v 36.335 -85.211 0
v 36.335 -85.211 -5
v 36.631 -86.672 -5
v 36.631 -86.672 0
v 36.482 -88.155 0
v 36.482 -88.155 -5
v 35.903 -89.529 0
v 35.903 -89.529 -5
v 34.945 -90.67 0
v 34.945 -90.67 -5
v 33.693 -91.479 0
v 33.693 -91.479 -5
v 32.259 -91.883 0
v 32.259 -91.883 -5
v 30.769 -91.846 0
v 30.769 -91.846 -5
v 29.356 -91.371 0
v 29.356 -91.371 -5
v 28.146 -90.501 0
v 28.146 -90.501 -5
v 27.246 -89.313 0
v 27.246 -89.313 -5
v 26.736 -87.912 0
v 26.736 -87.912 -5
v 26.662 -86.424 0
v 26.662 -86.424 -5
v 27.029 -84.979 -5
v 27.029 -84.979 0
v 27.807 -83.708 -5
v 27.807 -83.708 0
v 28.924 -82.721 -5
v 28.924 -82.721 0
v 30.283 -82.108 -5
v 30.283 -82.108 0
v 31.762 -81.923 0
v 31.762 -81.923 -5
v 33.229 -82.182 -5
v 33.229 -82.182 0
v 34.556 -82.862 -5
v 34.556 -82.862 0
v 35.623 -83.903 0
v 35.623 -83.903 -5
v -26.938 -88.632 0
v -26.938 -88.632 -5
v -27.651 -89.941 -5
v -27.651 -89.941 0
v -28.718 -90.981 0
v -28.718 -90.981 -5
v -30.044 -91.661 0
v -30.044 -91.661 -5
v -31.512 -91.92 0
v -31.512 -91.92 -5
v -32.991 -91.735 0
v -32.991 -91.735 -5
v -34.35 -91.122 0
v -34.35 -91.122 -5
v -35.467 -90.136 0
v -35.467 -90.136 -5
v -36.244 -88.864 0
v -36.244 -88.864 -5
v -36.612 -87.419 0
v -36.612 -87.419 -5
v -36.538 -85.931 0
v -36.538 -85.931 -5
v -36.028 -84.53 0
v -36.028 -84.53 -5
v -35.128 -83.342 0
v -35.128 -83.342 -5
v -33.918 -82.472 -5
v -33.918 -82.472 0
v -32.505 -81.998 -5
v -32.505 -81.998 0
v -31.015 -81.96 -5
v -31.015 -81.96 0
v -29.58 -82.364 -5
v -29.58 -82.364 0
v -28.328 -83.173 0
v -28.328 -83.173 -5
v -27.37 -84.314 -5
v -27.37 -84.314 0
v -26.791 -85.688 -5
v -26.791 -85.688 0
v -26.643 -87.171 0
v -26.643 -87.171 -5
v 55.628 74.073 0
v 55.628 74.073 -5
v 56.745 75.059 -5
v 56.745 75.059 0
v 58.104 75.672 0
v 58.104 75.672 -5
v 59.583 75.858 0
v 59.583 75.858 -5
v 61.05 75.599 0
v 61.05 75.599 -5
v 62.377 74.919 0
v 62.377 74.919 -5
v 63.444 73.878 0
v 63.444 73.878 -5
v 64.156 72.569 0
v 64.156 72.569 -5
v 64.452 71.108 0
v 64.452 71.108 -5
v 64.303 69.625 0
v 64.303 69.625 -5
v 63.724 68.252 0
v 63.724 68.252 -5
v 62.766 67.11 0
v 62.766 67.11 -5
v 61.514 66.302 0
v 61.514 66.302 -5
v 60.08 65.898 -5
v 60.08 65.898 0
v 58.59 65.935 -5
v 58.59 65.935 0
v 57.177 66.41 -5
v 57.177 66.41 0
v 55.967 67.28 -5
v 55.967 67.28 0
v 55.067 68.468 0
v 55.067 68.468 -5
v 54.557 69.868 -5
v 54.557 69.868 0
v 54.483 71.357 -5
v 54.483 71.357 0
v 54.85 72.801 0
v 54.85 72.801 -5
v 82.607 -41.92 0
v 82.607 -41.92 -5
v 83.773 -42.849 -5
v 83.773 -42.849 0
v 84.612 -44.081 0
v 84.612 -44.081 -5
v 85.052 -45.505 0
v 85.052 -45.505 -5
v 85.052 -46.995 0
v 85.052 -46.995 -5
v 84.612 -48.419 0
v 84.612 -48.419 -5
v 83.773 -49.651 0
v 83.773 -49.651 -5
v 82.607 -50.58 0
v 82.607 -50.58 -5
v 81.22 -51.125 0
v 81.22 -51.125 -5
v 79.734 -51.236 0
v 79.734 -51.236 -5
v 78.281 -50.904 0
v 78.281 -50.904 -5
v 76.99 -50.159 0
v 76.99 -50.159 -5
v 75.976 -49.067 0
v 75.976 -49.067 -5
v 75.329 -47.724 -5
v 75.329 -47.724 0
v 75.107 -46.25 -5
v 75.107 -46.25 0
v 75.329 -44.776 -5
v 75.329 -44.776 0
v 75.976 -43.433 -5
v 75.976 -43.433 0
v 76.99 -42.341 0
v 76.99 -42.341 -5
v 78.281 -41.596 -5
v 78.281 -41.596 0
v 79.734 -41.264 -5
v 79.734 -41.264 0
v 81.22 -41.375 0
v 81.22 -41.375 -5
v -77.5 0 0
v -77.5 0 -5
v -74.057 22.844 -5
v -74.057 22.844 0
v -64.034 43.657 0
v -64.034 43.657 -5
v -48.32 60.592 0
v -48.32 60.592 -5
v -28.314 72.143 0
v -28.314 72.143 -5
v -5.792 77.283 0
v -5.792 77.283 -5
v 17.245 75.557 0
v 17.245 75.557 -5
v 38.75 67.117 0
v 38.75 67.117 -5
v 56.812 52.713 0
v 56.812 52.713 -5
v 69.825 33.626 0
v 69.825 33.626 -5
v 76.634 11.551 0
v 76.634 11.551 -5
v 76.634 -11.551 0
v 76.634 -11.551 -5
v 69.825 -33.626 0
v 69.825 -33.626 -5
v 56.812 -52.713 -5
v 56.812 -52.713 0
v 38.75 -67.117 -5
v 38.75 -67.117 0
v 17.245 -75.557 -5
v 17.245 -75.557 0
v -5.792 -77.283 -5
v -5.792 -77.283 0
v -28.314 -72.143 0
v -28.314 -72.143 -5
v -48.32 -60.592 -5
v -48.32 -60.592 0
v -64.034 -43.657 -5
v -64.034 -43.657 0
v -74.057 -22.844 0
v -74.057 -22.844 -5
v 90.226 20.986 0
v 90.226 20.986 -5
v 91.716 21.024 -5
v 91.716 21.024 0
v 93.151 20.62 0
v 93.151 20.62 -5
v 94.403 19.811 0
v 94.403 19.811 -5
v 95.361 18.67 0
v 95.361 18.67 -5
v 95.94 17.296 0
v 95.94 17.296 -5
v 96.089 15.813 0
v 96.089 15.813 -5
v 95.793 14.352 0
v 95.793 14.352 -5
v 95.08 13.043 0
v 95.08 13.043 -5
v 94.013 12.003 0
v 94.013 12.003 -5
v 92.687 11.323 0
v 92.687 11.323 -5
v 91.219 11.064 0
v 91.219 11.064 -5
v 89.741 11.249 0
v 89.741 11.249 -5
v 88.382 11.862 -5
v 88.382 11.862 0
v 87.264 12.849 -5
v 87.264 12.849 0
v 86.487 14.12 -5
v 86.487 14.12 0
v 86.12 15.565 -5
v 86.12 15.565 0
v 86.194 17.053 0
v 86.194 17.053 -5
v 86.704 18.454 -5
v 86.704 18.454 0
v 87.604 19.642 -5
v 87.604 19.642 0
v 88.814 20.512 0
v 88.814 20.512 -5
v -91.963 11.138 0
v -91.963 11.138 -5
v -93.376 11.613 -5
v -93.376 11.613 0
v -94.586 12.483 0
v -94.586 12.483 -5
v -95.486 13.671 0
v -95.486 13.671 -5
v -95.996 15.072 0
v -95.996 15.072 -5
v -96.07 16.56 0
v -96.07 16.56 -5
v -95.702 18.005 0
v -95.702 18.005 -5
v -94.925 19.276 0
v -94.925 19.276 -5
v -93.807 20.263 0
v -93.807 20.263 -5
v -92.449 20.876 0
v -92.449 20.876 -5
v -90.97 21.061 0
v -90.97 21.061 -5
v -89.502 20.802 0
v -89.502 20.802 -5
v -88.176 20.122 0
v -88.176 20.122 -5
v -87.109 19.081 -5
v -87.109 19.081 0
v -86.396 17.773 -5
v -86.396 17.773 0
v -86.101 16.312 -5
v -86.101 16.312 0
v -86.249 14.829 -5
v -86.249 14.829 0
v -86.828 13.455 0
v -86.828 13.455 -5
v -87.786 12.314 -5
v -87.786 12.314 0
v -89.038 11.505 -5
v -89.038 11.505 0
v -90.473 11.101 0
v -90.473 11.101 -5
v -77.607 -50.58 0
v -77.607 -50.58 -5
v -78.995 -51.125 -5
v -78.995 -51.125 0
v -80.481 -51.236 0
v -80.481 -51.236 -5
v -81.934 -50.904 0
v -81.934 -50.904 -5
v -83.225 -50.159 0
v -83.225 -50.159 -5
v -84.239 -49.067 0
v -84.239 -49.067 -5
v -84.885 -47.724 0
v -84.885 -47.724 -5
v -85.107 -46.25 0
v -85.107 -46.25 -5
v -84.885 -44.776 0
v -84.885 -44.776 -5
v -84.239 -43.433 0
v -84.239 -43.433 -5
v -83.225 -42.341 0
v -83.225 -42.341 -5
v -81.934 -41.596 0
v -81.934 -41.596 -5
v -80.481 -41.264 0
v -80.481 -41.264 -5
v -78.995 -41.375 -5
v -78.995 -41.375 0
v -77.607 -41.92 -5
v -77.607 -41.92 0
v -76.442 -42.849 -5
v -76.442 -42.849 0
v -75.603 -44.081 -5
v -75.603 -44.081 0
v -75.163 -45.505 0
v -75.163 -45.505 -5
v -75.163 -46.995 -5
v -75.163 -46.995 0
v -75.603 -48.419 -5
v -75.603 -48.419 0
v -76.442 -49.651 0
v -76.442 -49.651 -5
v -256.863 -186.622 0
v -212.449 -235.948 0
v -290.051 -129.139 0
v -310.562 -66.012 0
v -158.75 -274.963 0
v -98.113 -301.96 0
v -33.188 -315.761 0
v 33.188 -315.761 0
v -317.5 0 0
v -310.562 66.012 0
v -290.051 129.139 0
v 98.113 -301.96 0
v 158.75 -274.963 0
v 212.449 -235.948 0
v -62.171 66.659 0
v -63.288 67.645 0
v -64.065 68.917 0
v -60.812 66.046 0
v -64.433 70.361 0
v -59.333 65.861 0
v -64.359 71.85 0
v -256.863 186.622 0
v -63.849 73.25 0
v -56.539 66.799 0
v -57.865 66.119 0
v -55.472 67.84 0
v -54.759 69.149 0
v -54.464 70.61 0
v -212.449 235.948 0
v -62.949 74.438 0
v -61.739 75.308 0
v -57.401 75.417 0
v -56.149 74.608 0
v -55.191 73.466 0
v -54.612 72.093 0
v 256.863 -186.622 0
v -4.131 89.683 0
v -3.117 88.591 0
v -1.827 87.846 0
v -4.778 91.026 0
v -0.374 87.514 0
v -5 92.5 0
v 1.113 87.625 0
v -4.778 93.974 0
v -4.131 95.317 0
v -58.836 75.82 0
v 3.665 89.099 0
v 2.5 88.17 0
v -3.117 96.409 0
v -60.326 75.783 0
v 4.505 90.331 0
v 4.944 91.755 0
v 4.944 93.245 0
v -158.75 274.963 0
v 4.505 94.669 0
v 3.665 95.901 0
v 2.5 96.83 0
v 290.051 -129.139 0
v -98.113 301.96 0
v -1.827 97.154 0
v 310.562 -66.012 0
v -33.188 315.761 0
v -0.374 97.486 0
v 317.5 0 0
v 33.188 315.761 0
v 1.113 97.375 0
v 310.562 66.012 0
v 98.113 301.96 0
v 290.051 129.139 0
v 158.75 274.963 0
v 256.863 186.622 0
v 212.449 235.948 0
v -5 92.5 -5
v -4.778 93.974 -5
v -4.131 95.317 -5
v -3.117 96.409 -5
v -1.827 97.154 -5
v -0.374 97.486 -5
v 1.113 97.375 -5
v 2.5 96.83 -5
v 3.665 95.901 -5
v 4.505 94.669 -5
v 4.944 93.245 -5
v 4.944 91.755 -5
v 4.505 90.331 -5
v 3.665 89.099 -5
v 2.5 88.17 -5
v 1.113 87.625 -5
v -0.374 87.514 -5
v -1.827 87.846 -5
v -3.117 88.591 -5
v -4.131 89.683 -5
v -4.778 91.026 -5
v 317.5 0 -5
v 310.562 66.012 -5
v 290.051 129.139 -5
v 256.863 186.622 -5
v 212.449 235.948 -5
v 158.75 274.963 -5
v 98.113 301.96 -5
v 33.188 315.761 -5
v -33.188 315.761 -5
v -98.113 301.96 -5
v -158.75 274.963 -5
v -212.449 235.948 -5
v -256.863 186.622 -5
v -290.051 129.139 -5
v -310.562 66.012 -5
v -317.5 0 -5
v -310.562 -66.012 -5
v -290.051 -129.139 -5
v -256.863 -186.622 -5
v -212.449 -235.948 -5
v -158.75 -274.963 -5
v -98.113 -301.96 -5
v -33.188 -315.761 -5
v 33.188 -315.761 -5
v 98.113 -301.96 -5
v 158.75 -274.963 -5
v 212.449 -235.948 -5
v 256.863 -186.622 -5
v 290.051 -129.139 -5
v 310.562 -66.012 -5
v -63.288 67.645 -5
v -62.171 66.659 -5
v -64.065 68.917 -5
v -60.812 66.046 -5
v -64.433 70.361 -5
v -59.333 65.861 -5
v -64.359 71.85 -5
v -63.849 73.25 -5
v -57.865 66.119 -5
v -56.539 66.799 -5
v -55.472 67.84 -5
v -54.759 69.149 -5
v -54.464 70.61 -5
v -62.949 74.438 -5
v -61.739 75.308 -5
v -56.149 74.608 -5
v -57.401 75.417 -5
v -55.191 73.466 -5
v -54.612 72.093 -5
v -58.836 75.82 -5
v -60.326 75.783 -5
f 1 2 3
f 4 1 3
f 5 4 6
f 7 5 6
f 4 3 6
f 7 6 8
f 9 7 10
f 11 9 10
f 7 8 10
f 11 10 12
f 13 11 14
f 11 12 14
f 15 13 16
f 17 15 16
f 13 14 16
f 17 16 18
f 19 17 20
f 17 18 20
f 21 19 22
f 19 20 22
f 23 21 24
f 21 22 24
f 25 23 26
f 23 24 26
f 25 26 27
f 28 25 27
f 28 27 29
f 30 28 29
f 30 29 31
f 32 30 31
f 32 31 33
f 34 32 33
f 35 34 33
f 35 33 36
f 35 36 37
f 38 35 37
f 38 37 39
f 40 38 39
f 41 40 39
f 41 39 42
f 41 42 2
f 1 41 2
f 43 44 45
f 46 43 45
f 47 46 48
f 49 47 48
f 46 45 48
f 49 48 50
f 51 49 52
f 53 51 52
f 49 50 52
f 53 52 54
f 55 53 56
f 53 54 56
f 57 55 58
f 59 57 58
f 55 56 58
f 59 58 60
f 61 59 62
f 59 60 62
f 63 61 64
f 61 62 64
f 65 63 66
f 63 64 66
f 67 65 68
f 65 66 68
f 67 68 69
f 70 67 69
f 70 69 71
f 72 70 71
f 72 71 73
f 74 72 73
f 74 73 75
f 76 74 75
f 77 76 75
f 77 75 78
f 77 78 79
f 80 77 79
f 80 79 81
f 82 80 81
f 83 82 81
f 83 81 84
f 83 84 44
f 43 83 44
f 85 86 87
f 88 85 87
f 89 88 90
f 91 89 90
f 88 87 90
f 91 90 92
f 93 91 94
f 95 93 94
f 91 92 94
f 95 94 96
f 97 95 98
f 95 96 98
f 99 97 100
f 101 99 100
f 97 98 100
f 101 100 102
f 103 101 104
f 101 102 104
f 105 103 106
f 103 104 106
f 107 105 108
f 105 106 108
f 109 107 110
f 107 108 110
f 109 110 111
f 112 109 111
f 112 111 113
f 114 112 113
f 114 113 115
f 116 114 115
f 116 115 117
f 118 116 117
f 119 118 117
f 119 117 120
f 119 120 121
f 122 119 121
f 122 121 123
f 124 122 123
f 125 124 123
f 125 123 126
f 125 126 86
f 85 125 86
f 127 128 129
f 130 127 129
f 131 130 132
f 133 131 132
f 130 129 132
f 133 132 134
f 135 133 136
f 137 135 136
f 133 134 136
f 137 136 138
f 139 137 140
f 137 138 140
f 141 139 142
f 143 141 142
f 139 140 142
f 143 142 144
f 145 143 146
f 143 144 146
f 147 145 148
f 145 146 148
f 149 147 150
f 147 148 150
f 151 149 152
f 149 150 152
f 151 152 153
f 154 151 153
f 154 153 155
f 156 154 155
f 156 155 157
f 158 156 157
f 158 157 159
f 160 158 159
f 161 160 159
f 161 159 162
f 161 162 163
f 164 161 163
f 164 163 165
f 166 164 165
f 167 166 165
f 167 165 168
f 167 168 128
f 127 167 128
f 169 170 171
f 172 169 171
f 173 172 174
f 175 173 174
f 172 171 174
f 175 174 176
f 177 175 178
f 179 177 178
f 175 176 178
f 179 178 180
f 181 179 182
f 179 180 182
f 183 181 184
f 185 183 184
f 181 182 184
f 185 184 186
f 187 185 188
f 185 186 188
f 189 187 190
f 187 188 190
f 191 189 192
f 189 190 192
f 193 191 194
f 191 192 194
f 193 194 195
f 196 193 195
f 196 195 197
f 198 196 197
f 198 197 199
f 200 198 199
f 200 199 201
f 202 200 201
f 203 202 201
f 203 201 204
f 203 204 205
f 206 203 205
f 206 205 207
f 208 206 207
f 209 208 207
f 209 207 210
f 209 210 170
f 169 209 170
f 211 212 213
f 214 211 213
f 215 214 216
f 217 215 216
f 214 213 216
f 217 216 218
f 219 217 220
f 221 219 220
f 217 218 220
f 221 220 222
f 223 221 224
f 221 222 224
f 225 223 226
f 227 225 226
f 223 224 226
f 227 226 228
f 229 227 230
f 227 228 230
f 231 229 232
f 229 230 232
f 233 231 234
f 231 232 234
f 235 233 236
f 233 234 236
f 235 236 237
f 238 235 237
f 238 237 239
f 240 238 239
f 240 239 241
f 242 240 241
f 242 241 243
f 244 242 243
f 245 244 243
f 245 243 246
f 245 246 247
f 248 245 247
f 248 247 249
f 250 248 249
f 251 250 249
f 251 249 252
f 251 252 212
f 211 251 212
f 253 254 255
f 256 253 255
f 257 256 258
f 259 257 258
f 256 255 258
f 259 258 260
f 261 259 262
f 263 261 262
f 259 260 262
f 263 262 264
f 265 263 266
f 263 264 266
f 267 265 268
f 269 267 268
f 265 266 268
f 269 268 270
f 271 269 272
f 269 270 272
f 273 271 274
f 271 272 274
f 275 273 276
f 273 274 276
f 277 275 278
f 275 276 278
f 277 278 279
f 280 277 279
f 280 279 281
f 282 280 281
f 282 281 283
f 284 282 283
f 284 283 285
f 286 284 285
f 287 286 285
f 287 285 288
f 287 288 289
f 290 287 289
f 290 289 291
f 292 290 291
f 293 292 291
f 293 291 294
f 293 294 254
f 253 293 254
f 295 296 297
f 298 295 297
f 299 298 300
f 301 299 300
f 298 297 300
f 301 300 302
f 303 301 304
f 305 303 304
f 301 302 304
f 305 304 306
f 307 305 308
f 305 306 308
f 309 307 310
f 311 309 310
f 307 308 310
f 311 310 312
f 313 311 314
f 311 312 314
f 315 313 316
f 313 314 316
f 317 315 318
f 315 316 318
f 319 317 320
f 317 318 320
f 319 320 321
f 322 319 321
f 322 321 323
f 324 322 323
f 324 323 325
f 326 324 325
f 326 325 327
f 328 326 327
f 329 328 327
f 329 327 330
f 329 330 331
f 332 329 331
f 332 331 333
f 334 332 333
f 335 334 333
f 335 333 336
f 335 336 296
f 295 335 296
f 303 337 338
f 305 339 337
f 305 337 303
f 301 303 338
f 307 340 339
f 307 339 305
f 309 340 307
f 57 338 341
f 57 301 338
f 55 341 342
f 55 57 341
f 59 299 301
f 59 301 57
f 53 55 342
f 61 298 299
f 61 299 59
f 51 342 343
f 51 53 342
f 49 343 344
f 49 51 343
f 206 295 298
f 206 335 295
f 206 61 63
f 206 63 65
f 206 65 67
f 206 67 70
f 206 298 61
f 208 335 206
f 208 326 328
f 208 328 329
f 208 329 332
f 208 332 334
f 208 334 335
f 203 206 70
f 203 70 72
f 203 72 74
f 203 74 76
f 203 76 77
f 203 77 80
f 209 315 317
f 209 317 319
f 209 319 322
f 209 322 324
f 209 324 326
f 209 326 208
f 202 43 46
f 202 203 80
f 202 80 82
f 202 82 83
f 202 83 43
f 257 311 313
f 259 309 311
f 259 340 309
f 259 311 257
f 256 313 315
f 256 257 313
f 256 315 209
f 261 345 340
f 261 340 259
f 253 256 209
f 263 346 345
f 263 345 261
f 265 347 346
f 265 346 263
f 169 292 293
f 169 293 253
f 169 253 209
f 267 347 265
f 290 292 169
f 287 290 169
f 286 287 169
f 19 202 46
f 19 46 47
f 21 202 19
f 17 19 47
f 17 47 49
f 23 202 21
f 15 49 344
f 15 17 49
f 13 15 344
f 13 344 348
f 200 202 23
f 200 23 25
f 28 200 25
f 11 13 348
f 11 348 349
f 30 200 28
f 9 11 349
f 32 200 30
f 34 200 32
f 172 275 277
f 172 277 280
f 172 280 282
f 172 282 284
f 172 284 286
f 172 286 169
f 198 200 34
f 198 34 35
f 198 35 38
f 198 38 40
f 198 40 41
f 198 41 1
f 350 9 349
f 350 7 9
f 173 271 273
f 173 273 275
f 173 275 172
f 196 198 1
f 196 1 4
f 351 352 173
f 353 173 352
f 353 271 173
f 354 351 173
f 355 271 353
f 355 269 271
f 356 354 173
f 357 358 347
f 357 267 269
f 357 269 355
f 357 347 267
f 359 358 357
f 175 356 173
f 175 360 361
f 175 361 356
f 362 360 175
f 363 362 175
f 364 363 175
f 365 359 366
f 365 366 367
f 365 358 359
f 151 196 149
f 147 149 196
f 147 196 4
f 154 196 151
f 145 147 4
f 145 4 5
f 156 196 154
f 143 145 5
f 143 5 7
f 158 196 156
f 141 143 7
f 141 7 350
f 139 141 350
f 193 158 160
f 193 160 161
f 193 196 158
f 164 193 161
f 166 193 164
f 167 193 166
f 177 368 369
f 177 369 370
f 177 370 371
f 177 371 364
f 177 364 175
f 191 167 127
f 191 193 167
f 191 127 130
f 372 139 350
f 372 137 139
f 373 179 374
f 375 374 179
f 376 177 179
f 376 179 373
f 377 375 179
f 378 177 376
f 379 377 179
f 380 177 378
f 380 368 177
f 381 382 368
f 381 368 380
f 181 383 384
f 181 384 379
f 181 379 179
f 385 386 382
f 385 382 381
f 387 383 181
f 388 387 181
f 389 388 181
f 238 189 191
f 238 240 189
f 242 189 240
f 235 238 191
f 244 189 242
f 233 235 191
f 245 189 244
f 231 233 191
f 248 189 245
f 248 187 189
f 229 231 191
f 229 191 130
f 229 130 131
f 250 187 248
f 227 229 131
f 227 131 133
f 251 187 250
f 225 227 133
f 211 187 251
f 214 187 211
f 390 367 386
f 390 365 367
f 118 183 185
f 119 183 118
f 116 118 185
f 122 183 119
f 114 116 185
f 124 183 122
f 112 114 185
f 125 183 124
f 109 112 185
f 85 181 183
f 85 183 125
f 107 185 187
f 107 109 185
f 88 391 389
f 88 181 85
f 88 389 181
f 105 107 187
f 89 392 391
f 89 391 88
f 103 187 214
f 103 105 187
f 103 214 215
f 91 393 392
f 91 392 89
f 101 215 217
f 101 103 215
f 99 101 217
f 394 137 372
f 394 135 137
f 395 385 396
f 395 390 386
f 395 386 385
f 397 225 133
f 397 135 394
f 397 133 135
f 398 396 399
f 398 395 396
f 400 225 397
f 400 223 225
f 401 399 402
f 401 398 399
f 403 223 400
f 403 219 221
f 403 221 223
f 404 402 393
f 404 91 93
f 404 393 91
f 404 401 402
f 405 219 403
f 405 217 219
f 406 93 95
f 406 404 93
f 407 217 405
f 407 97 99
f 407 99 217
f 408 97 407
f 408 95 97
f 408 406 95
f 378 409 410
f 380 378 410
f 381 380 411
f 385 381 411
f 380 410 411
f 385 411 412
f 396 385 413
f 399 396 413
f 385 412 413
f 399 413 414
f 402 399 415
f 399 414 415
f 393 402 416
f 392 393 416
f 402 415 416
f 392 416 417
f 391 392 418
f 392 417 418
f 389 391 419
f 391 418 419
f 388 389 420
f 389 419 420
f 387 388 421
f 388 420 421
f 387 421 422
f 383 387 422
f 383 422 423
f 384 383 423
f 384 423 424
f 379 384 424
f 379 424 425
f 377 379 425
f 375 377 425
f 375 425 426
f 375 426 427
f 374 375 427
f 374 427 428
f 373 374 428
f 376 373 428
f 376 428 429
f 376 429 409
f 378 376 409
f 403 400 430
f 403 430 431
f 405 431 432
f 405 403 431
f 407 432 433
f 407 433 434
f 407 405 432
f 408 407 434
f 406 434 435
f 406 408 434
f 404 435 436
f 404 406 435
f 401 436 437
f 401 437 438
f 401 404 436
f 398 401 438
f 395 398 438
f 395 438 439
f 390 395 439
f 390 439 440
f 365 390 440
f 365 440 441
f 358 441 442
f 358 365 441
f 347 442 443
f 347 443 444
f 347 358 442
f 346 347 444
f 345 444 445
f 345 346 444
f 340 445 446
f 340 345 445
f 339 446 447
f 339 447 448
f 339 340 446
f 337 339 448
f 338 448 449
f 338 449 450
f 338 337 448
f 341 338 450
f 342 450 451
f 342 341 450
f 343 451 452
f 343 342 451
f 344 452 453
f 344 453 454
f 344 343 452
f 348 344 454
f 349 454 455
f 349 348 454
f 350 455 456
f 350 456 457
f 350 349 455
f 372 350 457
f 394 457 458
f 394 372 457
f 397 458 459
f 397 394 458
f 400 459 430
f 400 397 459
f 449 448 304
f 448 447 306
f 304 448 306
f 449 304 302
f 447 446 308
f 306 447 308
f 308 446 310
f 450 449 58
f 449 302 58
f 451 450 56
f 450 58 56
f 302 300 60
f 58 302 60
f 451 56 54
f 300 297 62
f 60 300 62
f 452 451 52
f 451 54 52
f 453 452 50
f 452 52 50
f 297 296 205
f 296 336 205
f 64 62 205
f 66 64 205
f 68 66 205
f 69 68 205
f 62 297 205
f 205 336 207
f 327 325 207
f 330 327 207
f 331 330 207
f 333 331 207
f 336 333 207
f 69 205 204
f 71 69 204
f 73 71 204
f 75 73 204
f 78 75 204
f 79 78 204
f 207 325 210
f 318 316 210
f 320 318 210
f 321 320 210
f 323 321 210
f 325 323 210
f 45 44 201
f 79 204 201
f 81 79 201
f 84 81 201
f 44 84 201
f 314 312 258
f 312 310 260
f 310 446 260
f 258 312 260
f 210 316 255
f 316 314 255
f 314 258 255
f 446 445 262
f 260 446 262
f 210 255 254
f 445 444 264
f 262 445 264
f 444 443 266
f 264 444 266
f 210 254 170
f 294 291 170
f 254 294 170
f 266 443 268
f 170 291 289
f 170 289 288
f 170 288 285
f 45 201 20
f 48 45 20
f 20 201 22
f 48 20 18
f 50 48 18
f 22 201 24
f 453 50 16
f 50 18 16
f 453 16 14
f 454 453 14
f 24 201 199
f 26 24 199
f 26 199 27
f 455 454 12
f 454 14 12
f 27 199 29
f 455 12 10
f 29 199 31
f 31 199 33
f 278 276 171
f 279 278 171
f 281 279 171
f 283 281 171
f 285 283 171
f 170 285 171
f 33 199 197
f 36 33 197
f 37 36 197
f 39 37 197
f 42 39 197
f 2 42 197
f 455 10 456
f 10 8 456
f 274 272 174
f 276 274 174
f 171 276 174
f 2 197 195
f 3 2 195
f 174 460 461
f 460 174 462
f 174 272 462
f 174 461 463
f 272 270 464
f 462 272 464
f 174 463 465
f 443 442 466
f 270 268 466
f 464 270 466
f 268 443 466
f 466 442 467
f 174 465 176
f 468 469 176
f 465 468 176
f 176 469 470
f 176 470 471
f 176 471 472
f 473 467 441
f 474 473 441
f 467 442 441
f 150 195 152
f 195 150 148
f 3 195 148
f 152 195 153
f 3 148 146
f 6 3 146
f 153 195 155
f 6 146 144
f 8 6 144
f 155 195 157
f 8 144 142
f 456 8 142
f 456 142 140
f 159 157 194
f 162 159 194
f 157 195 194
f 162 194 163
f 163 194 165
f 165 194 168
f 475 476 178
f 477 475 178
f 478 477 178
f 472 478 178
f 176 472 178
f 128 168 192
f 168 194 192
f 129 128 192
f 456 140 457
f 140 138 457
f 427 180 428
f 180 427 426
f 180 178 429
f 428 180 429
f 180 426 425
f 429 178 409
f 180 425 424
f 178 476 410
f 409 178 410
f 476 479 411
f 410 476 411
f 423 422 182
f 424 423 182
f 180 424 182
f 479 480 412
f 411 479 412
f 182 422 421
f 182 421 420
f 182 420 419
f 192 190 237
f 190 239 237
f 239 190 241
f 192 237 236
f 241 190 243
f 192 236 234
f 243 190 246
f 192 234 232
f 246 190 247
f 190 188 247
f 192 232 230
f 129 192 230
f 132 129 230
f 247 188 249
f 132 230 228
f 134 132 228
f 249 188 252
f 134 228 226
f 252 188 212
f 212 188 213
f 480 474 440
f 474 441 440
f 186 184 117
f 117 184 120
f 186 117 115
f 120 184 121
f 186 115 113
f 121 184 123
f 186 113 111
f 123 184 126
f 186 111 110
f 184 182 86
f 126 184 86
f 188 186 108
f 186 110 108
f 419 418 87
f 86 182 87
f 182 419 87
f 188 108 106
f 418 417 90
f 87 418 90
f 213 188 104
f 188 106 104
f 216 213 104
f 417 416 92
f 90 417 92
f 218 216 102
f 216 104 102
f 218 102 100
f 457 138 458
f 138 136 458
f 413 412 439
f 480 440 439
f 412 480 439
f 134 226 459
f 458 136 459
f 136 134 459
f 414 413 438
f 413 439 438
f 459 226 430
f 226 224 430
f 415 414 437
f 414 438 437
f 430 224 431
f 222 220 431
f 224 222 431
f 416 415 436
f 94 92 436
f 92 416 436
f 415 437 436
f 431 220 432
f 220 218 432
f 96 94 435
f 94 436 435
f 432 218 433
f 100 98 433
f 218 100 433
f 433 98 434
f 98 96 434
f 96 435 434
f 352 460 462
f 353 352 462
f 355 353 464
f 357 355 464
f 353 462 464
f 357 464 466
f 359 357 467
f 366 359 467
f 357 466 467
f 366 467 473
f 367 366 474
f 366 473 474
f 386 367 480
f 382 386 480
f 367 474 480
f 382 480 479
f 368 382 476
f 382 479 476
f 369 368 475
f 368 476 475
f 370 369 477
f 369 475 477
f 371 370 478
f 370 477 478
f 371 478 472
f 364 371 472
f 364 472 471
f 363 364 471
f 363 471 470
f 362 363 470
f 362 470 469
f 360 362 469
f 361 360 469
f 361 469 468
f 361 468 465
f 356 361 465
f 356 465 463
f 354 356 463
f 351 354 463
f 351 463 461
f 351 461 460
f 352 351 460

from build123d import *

# Parameters (mm, degrees)
SKETCH1_R          = 317.5
BASE_FLANGE1_DEPTH = 5
SKETCH8_R          = 77.5
CUT_EXTRUDE1_DEPTH = 10
SKETCH15_R         = 5
CUT_EXTRUDE2_DEPTH = 10
CIRPATTERN1_COUNT  = 9


# Sheet-metal steps are written as plain solids
with BuildPart() as part:
    # Sketch1 → Base-Flange1 (new body)
    with BuildSketch(Plane.XY):
        Circle(SKETCH1_R)
    extrude(amount=-BASE_FLANGE1_DEPTH)

    # Sketch8 → Cut-Extrude1 (cut)
    with BuildSketch(Plane(origin=(0, 0, -5), x_dir=(-1, 0, 0), z_dir=(0, 0, -1))):
        Circle(SKETCH8_R)
    extrude(amount=-CUT_EXTRUDE1_DEPTH, mode=Mode.SUBTRACT)

    # Sketch15 → Cut-Extrude2 (cut)
    with BuildSketch(Plane(origin=(0, 0, -5), x_dir=(-1, 0, 0), z_dir=(0, 0, -1))):
        with Locations((0, 92.5)):
            Circle(SKETCH15_R)
    cut_extrude2 = extrude(amount=-CUT_EXTRUDE2_DEPTH, mode=Mode.SUBTRACT)

    # CirPattern1: Cut-Extrude2 ×9 about axis
    cirpattern1_axis = Axis((0, 0, 0), (0, 0, 1))
    for i in range(1, CIRPATTERN1_COUNT):
        add(cut_extrude2.rotate(cirpattern1_axis, i * 360 / CIRPATTERN1_COUNT), mode=Mode.SUBTRACT)


solid = part.part
